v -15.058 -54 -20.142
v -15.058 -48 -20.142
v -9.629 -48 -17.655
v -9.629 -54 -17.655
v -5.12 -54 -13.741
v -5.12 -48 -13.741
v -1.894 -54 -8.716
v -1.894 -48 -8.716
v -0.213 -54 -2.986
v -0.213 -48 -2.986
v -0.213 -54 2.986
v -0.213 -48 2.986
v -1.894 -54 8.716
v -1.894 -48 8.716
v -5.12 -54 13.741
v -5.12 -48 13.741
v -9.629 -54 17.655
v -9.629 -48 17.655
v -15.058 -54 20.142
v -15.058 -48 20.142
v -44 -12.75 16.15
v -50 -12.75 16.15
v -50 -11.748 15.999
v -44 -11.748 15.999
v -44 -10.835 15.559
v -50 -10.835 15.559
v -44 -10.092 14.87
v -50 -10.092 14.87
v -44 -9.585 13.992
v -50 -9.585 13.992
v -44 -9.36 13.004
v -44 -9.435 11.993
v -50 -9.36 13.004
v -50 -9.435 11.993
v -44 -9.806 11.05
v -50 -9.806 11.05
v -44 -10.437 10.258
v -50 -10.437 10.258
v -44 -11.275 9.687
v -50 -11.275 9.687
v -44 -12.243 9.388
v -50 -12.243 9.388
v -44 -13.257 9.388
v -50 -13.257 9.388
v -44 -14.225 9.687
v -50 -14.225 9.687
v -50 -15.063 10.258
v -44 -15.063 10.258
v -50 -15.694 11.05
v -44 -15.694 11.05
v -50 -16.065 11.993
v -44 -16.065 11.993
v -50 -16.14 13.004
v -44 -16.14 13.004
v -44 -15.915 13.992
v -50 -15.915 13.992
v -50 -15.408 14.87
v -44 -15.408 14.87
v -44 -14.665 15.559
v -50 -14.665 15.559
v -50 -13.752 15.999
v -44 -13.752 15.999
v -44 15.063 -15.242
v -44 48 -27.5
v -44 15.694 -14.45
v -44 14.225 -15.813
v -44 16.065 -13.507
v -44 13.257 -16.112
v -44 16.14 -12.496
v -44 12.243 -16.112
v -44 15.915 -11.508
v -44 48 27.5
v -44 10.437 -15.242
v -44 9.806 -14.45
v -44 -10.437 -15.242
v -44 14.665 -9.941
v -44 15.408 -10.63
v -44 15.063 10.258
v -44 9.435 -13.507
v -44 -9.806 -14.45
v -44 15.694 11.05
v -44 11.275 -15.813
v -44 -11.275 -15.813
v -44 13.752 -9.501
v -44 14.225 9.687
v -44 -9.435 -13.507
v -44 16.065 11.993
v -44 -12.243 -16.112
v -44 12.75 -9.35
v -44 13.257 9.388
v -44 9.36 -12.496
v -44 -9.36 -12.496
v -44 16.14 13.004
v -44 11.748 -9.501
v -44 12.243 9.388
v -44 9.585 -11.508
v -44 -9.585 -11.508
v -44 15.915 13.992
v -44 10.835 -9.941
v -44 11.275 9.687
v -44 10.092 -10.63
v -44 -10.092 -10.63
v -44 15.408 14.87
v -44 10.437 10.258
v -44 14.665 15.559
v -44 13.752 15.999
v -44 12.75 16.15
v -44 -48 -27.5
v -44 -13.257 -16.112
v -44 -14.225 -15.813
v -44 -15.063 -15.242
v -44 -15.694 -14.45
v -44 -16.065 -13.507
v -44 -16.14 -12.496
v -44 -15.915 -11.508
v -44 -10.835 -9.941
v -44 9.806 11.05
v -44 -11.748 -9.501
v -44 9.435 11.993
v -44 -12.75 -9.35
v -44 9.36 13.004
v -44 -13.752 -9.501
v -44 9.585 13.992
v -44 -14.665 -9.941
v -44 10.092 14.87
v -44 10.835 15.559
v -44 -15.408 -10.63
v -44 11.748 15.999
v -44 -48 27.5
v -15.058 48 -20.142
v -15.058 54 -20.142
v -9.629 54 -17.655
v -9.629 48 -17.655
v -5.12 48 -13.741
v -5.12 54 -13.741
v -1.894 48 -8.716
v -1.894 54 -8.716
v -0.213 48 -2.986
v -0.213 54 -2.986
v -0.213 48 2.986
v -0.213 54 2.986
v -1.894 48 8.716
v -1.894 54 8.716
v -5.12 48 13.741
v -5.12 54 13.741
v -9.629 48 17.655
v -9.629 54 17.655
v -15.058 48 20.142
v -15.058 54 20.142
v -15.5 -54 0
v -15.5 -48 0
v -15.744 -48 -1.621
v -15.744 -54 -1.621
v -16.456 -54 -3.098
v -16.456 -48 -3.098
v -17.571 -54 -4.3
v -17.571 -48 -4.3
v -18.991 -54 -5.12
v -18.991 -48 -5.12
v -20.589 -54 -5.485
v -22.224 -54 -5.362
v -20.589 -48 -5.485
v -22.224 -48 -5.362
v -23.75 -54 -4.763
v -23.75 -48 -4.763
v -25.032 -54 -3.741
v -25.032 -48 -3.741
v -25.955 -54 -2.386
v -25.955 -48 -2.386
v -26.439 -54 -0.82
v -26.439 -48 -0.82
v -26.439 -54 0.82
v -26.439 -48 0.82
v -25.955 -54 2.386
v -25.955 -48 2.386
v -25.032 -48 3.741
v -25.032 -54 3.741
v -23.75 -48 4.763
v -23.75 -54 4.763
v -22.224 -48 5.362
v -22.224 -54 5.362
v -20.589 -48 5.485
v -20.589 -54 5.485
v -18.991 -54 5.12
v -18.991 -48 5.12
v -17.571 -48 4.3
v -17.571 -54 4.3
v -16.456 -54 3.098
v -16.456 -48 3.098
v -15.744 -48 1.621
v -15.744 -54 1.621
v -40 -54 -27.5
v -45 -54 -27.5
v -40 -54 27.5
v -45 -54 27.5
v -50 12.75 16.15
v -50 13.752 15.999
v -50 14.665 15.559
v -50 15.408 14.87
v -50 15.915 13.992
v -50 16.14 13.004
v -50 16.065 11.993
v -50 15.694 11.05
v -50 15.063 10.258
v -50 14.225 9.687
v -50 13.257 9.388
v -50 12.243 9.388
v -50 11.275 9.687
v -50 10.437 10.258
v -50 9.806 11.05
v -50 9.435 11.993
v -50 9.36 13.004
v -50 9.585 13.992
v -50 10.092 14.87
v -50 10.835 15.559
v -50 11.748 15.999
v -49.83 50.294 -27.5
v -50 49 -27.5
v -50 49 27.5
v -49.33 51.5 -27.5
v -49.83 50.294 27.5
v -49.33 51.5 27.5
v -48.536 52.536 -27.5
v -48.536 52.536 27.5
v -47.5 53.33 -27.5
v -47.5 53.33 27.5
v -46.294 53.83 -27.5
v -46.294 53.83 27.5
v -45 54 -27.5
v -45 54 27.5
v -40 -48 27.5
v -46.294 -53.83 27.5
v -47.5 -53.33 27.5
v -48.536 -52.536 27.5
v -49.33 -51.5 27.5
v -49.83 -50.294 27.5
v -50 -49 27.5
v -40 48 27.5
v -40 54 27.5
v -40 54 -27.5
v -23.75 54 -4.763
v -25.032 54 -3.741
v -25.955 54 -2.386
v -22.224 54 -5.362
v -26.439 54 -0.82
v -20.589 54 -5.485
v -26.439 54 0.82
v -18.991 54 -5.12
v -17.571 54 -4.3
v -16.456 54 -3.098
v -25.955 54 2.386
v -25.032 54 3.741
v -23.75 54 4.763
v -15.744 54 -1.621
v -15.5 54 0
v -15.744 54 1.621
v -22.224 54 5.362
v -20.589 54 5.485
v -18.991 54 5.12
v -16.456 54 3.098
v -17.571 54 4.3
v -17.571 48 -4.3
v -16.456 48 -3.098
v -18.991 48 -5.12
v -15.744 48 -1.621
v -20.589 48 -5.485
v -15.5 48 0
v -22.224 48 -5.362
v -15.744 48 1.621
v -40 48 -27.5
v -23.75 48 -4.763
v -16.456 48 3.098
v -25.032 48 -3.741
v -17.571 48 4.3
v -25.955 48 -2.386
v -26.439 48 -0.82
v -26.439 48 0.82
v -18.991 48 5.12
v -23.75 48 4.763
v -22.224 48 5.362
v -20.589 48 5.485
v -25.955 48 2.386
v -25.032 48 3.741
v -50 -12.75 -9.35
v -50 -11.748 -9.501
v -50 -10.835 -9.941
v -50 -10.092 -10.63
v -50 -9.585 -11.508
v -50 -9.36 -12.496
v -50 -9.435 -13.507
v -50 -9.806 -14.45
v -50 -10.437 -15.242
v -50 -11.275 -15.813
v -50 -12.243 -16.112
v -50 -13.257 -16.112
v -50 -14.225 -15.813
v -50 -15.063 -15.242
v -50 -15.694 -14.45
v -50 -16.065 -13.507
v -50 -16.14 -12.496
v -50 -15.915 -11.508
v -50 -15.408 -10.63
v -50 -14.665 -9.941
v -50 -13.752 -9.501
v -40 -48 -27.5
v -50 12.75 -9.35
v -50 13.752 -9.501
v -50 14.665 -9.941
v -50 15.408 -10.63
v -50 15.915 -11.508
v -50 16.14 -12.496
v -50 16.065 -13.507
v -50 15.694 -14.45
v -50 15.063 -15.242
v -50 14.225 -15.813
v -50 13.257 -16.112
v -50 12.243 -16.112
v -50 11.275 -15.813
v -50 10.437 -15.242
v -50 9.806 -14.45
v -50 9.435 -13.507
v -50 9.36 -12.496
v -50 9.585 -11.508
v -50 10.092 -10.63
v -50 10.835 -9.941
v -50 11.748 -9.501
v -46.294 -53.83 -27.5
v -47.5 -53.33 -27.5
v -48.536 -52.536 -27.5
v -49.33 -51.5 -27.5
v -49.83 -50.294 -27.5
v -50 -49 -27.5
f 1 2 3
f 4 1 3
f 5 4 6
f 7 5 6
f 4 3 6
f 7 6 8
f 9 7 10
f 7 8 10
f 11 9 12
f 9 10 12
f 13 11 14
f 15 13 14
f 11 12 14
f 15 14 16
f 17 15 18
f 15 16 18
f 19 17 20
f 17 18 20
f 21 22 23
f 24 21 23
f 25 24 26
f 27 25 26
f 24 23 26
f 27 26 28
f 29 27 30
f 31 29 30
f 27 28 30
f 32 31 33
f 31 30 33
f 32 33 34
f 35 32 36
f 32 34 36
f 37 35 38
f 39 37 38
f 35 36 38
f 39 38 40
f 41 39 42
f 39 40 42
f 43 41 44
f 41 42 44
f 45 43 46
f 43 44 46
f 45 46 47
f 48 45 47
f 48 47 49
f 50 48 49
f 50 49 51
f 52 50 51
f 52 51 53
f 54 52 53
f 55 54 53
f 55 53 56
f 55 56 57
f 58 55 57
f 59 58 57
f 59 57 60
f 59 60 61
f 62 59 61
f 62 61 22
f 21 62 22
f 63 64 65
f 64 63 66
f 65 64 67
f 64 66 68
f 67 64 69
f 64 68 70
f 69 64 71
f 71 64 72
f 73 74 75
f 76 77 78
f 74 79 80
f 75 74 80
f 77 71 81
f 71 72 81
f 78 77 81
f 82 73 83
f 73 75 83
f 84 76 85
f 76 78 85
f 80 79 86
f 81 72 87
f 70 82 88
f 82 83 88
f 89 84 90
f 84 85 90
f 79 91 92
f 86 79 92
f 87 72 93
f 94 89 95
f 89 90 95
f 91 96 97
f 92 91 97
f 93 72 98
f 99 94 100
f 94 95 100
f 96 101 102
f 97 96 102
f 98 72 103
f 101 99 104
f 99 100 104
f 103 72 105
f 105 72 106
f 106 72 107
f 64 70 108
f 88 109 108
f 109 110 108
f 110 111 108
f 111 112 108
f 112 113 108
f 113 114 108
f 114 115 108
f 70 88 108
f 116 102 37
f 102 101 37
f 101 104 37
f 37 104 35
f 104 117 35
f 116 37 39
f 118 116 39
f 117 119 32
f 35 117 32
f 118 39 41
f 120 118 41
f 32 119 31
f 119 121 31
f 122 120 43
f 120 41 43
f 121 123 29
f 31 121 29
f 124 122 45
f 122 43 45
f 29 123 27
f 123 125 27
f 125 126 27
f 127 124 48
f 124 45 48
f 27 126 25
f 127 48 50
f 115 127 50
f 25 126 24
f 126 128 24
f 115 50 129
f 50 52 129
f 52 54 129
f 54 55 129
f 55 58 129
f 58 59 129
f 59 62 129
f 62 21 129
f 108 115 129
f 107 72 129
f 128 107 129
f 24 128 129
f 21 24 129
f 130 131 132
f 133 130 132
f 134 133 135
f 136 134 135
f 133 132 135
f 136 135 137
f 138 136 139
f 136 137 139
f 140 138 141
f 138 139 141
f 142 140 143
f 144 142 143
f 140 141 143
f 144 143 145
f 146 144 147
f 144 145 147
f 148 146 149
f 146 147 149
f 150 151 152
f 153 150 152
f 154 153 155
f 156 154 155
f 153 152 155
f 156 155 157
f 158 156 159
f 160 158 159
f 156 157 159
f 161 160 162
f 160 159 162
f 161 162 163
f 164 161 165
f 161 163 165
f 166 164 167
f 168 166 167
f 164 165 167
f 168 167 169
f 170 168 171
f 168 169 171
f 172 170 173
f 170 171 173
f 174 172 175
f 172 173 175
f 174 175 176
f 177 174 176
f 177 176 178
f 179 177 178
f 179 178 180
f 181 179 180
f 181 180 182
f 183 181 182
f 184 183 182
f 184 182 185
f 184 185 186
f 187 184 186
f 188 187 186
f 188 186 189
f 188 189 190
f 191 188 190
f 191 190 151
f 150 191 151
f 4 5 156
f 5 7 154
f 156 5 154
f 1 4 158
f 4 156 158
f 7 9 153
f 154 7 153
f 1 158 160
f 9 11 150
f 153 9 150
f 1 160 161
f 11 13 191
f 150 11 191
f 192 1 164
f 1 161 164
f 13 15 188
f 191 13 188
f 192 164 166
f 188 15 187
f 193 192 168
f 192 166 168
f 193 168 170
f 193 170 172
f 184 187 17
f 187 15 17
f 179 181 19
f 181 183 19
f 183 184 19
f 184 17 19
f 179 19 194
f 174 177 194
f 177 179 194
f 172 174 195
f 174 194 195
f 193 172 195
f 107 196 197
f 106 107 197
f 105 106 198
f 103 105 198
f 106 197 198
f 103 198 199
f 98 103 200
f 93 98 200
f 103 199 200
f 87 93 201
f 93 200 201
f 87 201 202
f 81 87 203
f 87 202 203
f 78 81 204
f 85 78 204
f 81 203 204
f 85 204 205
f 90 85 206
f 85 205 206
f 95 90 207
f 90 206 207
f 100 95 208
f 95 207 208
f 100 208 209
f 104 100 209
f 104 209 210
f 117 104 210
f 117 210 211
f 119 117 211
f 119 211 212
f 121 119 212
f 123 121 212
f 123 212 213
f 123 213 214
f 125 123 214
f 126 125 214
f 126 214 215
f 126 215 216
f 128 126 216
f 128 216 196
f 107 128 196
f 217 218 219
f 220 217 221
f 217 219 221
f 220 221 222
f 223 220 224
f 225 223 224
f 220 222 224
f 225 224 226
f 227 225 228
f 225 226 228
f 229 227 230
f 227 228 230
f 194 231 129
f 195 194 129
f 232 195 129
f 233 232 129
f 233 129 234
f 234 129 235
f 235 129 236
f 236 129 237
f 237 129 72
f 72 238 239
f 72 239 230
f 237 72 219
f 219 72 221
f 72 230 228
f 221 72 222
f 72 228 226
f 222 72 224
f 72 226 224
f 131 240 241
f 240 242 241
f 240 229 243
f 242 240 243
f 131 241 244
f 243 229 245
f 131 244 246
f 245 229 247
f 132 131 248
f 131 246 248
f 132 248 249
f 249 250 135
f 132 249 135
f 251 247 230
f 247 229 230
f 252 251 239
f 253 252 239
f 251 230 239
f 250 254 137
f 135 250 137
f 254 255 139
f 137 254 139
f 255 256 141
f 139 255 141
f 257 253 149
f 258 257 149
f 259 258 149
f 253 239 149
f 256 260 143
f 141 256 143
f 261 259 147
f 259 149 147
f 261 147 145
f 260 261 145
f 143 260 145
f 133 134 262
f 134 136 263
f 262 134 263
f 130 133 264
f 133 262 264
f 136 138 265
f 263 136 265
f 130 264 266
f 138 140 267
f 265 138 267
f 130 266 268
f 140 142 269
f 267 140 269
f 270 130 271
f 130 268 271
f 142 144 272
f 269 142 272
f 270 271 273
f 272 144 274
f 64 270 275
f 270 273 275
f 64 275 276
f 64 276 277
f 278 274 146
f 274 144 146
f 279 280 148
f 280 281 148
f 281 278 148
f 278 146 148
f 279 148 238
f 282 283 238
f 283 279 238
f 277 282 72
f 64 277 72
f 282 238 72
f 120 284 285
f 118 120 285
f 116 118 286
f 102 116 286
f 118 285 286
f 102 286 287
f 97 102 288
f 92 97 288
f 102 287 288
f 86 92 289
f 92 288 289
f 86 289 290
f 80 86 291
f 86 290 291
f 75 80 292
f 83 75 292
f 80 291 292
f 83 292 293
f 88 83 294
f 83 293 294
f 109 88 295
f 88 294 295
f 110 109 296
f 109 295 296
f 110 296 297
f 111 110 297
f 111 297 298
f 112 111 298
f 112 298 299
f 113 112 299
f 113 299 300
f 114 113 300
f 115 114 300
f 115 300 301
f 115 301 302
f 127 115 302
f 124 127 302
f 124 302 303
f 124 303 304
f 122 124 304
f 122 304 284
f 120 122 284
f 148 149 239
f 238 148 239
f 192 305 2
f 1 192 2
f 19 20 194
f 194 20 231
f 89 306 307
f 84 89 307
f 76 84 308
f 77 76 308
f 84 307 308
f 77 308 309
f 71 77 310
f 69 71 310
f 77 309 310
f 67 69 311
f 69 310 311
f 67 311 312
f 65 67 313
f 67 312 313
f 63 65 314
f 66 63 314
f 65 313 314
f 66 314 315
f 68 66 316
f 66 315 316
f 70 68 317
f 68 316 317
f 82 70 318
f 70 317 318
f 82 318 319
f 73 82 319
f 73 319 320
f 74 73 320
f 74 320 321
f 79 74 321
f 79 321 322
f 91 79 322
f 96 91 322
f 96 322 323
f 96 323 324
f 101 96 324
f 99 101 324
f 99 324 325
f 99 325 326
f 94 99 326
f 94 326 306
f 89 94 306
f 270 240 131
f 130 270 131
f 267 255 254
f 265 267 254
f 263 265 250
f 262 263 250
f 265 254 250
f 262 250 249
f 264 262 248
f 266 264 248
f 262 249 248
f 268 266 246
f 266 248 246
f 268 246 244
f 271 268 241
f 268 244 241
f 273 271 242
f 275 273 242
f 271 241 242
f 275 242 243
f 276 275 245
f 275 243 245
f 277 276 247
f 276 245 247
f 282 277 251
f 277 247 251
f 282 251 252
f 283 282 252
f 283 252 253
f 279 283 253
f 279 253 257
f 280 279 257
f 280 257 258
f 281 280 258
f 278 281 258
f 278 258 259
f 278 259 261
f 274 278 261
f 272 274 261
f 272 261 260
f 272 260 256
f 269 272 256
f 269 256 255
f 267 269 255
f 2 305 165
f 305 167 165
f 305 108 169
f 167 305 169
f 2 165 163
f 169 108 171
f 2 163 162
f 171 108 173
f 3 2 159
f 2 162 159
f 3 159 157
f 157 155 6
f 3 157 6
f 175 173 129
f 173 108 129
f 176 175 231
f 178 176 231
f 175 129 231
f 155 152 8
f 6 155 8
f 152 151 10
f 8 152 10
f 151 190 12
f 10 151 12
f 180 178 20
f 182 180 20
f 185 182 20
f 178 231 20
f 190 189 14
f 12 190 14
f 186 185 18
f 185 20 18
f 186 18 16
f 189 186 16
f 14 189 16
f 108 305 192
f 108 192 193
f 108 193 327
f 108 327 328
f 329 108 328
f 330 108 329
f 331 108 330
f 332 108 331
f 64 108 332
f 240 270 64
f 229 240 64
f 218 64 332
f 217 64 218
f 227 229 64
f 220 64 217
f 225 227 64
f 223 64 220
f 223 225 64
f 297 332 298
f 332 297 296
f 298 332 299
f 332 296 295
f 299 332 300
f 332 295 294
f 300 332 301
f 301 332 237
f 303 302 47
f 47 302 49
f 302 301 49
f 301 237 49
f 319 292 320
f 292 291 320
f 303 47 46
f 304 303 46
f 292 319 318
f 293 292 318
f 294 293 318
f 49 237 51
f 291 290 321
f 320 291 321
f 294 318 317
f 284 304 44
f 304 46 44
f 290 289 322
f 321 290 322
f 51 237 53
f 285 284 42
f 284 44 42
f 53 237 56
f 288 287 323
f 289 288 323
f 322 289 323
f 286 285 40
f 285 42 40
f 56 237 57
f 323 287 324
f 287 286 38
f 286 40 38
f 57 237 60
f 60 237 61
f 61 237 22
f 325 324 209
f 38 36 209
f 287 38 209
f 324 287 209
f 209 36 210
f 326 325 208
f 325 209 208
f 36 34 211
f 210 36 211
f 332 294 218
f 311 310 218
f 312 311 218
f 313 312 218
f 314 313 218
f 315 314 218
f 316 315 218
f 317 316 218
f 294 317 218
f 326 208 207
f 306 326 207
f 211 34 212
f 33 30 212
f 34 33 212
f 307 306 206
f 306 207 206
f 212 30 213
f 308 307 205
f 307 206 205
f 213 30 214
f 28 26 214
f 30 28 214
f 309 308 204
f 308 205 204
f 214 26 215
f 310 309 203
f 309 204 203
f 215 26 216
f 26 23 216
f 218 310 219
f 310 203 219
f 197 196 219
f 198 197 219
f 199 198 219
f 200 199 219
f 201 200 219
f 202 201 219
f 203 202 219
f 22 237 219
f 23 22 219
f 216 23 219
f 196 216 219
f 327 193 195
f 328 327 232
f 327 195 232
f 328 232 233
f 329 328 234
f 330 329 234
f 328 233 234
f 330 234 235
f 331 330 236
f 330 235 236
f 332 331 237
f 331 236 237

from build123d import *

# Parameters (mm, degrees)
EXTRUDE_1_DEPTH          = 27.5
HOLE_WIZARD_M10_1_D      = 8.5
SKETCH_6_R               = 3.4
CUT_EXTRUDE_1_DEPTH      = 10
SKETCH_9_R               = 5
CUT_EXTRUDE_2_DEPTH      = 136
CUT_EXTRUDE_3_DEPTH      = 1
CUT_EXTRUDE_3_DEPTH_BACK = 109
SKETCH_14_R              = 5.5
CUT_EXTRUDE_5_DEPTH      = 108


with BuildPart() as part:
    # 草圖1 → 填料-伸長1 (new body, symmetric)
    with BuildSketch(Plane.XY):
        with BuildLine():
            Line((0, -54), (-45, -54))
            ThreePointArc((-45, -54), (-48.535533906, -52.535533906), (-50, -49))
            Line((-50, -49), (-50, 49))
            ThreePointArc((-50, 49), (-48.535533906, 52.535533906), (-45, 54))
            Line((-45, 54), (0, 54))
            Line((0, 54), (0, 48))
            Line((0, 48), (-44, 48))
            Line((-44, 48), (-44, -48))
            Line((-44, -48), (0, -48))
            Line((0, -48), (0, -54))
        make_face()
    extrude(amount=EXTRUDE_1_DEPTH, both=True)

    # M10 螺紋孔1 (through all)
    with Locations(Plane(origin=(0, 54, 0), x_dir=(1, 0, 0), z_dir=(0, 1, 0))):
        with Locations((-21, 0)):
            Hole(HOLE_WIZARD_M10_1_D / 2)

    # 草圖6 → 除料-伸長1 (cut)
    with BuildSketch(Plane.ZY.offset(50)):
        with Locations((12.75, 12.75)):
            Circle(SKETCH_6_R)
        with Locations((-12.75, 12.75)):
            Circle(SKETCH_6_R)
        with Locations((-12.75, -12.75)):
            Circle(SKETCH_6_R)
        with Locations((12.75, -12.75)):
            Circle(SKETCH_6_R)
    extrude(amount=-CUT_EXTRUDE_1_DEPTH, mode=Mode.SUBTRACT)

    # 草圖9 → 除料-伸長2 (cut)
    with BuildSketch(Plane(origin=(0, 54, 0), x_dir=(1, 0, 0), z_dir=(0, 1, 0))):
        with Locations((-21, 0)):
            Circle(SKETCH_9_R)
    extrude(amount=-CUT_EXTRUDE_2_DEPTH, mode=Mode.SUBTRACT)

    # 草圖10 → 除料-伸長3 (cut, two sides)
    with BuildSketch(Plane(origin=(0, 54, 0), x_dir=(1, 0, 0), z_dir=(0, 1, 0))) as cut_extrude_3_sk:
        with BuildLine():
            Line((-180.04752128, 68.815685703), (-40, 27.5))
            Line((-40, 27.5), (-15.057931362, 20.141792877))
            ThreePointArc((-15.057931362, 20.141792877), (0, 0), (-15.057931362, -20.141792877))
            Line((-15.057931362, -20.141792877), (-40, -27.5))
            Line((-40, -27.5), (-180.04752128, -68.815685703))
            Line((-180.04752128, -68.815685703), (111.981888895, -68.815685703))
            Line((111.981888895, -68.815685703), (111.981888895, 68.815685703))
            Line((111.981888895, 68.815685703), (-180.04752128, 68.815685703))
        make_face()
    extrude(amount=CUT_EXTRUDE_3_DEPTH, mode=Mode.SUBTRACT)
    extrude(cut_extrude_3_sk.sketch, amount=-CUT_EXTRUDE_3_DEPTH_BACK, mode=Mode.SUBTRACT)

    # 草圖14 → 除料-伸長5 (cut)
    with BuildSketch(Plane(origin=(0, 54, 0), x_dir=(1, 0, 0), z_dir=(0, 1, 0))):
        with Locations((-21, 0)):
            Circle(SKETCH_14_R)
    extrude(amount=-CUT_EXTRUDE_5_DEPTH, mode=Mode.SUBTRACT)


solid = part.part
